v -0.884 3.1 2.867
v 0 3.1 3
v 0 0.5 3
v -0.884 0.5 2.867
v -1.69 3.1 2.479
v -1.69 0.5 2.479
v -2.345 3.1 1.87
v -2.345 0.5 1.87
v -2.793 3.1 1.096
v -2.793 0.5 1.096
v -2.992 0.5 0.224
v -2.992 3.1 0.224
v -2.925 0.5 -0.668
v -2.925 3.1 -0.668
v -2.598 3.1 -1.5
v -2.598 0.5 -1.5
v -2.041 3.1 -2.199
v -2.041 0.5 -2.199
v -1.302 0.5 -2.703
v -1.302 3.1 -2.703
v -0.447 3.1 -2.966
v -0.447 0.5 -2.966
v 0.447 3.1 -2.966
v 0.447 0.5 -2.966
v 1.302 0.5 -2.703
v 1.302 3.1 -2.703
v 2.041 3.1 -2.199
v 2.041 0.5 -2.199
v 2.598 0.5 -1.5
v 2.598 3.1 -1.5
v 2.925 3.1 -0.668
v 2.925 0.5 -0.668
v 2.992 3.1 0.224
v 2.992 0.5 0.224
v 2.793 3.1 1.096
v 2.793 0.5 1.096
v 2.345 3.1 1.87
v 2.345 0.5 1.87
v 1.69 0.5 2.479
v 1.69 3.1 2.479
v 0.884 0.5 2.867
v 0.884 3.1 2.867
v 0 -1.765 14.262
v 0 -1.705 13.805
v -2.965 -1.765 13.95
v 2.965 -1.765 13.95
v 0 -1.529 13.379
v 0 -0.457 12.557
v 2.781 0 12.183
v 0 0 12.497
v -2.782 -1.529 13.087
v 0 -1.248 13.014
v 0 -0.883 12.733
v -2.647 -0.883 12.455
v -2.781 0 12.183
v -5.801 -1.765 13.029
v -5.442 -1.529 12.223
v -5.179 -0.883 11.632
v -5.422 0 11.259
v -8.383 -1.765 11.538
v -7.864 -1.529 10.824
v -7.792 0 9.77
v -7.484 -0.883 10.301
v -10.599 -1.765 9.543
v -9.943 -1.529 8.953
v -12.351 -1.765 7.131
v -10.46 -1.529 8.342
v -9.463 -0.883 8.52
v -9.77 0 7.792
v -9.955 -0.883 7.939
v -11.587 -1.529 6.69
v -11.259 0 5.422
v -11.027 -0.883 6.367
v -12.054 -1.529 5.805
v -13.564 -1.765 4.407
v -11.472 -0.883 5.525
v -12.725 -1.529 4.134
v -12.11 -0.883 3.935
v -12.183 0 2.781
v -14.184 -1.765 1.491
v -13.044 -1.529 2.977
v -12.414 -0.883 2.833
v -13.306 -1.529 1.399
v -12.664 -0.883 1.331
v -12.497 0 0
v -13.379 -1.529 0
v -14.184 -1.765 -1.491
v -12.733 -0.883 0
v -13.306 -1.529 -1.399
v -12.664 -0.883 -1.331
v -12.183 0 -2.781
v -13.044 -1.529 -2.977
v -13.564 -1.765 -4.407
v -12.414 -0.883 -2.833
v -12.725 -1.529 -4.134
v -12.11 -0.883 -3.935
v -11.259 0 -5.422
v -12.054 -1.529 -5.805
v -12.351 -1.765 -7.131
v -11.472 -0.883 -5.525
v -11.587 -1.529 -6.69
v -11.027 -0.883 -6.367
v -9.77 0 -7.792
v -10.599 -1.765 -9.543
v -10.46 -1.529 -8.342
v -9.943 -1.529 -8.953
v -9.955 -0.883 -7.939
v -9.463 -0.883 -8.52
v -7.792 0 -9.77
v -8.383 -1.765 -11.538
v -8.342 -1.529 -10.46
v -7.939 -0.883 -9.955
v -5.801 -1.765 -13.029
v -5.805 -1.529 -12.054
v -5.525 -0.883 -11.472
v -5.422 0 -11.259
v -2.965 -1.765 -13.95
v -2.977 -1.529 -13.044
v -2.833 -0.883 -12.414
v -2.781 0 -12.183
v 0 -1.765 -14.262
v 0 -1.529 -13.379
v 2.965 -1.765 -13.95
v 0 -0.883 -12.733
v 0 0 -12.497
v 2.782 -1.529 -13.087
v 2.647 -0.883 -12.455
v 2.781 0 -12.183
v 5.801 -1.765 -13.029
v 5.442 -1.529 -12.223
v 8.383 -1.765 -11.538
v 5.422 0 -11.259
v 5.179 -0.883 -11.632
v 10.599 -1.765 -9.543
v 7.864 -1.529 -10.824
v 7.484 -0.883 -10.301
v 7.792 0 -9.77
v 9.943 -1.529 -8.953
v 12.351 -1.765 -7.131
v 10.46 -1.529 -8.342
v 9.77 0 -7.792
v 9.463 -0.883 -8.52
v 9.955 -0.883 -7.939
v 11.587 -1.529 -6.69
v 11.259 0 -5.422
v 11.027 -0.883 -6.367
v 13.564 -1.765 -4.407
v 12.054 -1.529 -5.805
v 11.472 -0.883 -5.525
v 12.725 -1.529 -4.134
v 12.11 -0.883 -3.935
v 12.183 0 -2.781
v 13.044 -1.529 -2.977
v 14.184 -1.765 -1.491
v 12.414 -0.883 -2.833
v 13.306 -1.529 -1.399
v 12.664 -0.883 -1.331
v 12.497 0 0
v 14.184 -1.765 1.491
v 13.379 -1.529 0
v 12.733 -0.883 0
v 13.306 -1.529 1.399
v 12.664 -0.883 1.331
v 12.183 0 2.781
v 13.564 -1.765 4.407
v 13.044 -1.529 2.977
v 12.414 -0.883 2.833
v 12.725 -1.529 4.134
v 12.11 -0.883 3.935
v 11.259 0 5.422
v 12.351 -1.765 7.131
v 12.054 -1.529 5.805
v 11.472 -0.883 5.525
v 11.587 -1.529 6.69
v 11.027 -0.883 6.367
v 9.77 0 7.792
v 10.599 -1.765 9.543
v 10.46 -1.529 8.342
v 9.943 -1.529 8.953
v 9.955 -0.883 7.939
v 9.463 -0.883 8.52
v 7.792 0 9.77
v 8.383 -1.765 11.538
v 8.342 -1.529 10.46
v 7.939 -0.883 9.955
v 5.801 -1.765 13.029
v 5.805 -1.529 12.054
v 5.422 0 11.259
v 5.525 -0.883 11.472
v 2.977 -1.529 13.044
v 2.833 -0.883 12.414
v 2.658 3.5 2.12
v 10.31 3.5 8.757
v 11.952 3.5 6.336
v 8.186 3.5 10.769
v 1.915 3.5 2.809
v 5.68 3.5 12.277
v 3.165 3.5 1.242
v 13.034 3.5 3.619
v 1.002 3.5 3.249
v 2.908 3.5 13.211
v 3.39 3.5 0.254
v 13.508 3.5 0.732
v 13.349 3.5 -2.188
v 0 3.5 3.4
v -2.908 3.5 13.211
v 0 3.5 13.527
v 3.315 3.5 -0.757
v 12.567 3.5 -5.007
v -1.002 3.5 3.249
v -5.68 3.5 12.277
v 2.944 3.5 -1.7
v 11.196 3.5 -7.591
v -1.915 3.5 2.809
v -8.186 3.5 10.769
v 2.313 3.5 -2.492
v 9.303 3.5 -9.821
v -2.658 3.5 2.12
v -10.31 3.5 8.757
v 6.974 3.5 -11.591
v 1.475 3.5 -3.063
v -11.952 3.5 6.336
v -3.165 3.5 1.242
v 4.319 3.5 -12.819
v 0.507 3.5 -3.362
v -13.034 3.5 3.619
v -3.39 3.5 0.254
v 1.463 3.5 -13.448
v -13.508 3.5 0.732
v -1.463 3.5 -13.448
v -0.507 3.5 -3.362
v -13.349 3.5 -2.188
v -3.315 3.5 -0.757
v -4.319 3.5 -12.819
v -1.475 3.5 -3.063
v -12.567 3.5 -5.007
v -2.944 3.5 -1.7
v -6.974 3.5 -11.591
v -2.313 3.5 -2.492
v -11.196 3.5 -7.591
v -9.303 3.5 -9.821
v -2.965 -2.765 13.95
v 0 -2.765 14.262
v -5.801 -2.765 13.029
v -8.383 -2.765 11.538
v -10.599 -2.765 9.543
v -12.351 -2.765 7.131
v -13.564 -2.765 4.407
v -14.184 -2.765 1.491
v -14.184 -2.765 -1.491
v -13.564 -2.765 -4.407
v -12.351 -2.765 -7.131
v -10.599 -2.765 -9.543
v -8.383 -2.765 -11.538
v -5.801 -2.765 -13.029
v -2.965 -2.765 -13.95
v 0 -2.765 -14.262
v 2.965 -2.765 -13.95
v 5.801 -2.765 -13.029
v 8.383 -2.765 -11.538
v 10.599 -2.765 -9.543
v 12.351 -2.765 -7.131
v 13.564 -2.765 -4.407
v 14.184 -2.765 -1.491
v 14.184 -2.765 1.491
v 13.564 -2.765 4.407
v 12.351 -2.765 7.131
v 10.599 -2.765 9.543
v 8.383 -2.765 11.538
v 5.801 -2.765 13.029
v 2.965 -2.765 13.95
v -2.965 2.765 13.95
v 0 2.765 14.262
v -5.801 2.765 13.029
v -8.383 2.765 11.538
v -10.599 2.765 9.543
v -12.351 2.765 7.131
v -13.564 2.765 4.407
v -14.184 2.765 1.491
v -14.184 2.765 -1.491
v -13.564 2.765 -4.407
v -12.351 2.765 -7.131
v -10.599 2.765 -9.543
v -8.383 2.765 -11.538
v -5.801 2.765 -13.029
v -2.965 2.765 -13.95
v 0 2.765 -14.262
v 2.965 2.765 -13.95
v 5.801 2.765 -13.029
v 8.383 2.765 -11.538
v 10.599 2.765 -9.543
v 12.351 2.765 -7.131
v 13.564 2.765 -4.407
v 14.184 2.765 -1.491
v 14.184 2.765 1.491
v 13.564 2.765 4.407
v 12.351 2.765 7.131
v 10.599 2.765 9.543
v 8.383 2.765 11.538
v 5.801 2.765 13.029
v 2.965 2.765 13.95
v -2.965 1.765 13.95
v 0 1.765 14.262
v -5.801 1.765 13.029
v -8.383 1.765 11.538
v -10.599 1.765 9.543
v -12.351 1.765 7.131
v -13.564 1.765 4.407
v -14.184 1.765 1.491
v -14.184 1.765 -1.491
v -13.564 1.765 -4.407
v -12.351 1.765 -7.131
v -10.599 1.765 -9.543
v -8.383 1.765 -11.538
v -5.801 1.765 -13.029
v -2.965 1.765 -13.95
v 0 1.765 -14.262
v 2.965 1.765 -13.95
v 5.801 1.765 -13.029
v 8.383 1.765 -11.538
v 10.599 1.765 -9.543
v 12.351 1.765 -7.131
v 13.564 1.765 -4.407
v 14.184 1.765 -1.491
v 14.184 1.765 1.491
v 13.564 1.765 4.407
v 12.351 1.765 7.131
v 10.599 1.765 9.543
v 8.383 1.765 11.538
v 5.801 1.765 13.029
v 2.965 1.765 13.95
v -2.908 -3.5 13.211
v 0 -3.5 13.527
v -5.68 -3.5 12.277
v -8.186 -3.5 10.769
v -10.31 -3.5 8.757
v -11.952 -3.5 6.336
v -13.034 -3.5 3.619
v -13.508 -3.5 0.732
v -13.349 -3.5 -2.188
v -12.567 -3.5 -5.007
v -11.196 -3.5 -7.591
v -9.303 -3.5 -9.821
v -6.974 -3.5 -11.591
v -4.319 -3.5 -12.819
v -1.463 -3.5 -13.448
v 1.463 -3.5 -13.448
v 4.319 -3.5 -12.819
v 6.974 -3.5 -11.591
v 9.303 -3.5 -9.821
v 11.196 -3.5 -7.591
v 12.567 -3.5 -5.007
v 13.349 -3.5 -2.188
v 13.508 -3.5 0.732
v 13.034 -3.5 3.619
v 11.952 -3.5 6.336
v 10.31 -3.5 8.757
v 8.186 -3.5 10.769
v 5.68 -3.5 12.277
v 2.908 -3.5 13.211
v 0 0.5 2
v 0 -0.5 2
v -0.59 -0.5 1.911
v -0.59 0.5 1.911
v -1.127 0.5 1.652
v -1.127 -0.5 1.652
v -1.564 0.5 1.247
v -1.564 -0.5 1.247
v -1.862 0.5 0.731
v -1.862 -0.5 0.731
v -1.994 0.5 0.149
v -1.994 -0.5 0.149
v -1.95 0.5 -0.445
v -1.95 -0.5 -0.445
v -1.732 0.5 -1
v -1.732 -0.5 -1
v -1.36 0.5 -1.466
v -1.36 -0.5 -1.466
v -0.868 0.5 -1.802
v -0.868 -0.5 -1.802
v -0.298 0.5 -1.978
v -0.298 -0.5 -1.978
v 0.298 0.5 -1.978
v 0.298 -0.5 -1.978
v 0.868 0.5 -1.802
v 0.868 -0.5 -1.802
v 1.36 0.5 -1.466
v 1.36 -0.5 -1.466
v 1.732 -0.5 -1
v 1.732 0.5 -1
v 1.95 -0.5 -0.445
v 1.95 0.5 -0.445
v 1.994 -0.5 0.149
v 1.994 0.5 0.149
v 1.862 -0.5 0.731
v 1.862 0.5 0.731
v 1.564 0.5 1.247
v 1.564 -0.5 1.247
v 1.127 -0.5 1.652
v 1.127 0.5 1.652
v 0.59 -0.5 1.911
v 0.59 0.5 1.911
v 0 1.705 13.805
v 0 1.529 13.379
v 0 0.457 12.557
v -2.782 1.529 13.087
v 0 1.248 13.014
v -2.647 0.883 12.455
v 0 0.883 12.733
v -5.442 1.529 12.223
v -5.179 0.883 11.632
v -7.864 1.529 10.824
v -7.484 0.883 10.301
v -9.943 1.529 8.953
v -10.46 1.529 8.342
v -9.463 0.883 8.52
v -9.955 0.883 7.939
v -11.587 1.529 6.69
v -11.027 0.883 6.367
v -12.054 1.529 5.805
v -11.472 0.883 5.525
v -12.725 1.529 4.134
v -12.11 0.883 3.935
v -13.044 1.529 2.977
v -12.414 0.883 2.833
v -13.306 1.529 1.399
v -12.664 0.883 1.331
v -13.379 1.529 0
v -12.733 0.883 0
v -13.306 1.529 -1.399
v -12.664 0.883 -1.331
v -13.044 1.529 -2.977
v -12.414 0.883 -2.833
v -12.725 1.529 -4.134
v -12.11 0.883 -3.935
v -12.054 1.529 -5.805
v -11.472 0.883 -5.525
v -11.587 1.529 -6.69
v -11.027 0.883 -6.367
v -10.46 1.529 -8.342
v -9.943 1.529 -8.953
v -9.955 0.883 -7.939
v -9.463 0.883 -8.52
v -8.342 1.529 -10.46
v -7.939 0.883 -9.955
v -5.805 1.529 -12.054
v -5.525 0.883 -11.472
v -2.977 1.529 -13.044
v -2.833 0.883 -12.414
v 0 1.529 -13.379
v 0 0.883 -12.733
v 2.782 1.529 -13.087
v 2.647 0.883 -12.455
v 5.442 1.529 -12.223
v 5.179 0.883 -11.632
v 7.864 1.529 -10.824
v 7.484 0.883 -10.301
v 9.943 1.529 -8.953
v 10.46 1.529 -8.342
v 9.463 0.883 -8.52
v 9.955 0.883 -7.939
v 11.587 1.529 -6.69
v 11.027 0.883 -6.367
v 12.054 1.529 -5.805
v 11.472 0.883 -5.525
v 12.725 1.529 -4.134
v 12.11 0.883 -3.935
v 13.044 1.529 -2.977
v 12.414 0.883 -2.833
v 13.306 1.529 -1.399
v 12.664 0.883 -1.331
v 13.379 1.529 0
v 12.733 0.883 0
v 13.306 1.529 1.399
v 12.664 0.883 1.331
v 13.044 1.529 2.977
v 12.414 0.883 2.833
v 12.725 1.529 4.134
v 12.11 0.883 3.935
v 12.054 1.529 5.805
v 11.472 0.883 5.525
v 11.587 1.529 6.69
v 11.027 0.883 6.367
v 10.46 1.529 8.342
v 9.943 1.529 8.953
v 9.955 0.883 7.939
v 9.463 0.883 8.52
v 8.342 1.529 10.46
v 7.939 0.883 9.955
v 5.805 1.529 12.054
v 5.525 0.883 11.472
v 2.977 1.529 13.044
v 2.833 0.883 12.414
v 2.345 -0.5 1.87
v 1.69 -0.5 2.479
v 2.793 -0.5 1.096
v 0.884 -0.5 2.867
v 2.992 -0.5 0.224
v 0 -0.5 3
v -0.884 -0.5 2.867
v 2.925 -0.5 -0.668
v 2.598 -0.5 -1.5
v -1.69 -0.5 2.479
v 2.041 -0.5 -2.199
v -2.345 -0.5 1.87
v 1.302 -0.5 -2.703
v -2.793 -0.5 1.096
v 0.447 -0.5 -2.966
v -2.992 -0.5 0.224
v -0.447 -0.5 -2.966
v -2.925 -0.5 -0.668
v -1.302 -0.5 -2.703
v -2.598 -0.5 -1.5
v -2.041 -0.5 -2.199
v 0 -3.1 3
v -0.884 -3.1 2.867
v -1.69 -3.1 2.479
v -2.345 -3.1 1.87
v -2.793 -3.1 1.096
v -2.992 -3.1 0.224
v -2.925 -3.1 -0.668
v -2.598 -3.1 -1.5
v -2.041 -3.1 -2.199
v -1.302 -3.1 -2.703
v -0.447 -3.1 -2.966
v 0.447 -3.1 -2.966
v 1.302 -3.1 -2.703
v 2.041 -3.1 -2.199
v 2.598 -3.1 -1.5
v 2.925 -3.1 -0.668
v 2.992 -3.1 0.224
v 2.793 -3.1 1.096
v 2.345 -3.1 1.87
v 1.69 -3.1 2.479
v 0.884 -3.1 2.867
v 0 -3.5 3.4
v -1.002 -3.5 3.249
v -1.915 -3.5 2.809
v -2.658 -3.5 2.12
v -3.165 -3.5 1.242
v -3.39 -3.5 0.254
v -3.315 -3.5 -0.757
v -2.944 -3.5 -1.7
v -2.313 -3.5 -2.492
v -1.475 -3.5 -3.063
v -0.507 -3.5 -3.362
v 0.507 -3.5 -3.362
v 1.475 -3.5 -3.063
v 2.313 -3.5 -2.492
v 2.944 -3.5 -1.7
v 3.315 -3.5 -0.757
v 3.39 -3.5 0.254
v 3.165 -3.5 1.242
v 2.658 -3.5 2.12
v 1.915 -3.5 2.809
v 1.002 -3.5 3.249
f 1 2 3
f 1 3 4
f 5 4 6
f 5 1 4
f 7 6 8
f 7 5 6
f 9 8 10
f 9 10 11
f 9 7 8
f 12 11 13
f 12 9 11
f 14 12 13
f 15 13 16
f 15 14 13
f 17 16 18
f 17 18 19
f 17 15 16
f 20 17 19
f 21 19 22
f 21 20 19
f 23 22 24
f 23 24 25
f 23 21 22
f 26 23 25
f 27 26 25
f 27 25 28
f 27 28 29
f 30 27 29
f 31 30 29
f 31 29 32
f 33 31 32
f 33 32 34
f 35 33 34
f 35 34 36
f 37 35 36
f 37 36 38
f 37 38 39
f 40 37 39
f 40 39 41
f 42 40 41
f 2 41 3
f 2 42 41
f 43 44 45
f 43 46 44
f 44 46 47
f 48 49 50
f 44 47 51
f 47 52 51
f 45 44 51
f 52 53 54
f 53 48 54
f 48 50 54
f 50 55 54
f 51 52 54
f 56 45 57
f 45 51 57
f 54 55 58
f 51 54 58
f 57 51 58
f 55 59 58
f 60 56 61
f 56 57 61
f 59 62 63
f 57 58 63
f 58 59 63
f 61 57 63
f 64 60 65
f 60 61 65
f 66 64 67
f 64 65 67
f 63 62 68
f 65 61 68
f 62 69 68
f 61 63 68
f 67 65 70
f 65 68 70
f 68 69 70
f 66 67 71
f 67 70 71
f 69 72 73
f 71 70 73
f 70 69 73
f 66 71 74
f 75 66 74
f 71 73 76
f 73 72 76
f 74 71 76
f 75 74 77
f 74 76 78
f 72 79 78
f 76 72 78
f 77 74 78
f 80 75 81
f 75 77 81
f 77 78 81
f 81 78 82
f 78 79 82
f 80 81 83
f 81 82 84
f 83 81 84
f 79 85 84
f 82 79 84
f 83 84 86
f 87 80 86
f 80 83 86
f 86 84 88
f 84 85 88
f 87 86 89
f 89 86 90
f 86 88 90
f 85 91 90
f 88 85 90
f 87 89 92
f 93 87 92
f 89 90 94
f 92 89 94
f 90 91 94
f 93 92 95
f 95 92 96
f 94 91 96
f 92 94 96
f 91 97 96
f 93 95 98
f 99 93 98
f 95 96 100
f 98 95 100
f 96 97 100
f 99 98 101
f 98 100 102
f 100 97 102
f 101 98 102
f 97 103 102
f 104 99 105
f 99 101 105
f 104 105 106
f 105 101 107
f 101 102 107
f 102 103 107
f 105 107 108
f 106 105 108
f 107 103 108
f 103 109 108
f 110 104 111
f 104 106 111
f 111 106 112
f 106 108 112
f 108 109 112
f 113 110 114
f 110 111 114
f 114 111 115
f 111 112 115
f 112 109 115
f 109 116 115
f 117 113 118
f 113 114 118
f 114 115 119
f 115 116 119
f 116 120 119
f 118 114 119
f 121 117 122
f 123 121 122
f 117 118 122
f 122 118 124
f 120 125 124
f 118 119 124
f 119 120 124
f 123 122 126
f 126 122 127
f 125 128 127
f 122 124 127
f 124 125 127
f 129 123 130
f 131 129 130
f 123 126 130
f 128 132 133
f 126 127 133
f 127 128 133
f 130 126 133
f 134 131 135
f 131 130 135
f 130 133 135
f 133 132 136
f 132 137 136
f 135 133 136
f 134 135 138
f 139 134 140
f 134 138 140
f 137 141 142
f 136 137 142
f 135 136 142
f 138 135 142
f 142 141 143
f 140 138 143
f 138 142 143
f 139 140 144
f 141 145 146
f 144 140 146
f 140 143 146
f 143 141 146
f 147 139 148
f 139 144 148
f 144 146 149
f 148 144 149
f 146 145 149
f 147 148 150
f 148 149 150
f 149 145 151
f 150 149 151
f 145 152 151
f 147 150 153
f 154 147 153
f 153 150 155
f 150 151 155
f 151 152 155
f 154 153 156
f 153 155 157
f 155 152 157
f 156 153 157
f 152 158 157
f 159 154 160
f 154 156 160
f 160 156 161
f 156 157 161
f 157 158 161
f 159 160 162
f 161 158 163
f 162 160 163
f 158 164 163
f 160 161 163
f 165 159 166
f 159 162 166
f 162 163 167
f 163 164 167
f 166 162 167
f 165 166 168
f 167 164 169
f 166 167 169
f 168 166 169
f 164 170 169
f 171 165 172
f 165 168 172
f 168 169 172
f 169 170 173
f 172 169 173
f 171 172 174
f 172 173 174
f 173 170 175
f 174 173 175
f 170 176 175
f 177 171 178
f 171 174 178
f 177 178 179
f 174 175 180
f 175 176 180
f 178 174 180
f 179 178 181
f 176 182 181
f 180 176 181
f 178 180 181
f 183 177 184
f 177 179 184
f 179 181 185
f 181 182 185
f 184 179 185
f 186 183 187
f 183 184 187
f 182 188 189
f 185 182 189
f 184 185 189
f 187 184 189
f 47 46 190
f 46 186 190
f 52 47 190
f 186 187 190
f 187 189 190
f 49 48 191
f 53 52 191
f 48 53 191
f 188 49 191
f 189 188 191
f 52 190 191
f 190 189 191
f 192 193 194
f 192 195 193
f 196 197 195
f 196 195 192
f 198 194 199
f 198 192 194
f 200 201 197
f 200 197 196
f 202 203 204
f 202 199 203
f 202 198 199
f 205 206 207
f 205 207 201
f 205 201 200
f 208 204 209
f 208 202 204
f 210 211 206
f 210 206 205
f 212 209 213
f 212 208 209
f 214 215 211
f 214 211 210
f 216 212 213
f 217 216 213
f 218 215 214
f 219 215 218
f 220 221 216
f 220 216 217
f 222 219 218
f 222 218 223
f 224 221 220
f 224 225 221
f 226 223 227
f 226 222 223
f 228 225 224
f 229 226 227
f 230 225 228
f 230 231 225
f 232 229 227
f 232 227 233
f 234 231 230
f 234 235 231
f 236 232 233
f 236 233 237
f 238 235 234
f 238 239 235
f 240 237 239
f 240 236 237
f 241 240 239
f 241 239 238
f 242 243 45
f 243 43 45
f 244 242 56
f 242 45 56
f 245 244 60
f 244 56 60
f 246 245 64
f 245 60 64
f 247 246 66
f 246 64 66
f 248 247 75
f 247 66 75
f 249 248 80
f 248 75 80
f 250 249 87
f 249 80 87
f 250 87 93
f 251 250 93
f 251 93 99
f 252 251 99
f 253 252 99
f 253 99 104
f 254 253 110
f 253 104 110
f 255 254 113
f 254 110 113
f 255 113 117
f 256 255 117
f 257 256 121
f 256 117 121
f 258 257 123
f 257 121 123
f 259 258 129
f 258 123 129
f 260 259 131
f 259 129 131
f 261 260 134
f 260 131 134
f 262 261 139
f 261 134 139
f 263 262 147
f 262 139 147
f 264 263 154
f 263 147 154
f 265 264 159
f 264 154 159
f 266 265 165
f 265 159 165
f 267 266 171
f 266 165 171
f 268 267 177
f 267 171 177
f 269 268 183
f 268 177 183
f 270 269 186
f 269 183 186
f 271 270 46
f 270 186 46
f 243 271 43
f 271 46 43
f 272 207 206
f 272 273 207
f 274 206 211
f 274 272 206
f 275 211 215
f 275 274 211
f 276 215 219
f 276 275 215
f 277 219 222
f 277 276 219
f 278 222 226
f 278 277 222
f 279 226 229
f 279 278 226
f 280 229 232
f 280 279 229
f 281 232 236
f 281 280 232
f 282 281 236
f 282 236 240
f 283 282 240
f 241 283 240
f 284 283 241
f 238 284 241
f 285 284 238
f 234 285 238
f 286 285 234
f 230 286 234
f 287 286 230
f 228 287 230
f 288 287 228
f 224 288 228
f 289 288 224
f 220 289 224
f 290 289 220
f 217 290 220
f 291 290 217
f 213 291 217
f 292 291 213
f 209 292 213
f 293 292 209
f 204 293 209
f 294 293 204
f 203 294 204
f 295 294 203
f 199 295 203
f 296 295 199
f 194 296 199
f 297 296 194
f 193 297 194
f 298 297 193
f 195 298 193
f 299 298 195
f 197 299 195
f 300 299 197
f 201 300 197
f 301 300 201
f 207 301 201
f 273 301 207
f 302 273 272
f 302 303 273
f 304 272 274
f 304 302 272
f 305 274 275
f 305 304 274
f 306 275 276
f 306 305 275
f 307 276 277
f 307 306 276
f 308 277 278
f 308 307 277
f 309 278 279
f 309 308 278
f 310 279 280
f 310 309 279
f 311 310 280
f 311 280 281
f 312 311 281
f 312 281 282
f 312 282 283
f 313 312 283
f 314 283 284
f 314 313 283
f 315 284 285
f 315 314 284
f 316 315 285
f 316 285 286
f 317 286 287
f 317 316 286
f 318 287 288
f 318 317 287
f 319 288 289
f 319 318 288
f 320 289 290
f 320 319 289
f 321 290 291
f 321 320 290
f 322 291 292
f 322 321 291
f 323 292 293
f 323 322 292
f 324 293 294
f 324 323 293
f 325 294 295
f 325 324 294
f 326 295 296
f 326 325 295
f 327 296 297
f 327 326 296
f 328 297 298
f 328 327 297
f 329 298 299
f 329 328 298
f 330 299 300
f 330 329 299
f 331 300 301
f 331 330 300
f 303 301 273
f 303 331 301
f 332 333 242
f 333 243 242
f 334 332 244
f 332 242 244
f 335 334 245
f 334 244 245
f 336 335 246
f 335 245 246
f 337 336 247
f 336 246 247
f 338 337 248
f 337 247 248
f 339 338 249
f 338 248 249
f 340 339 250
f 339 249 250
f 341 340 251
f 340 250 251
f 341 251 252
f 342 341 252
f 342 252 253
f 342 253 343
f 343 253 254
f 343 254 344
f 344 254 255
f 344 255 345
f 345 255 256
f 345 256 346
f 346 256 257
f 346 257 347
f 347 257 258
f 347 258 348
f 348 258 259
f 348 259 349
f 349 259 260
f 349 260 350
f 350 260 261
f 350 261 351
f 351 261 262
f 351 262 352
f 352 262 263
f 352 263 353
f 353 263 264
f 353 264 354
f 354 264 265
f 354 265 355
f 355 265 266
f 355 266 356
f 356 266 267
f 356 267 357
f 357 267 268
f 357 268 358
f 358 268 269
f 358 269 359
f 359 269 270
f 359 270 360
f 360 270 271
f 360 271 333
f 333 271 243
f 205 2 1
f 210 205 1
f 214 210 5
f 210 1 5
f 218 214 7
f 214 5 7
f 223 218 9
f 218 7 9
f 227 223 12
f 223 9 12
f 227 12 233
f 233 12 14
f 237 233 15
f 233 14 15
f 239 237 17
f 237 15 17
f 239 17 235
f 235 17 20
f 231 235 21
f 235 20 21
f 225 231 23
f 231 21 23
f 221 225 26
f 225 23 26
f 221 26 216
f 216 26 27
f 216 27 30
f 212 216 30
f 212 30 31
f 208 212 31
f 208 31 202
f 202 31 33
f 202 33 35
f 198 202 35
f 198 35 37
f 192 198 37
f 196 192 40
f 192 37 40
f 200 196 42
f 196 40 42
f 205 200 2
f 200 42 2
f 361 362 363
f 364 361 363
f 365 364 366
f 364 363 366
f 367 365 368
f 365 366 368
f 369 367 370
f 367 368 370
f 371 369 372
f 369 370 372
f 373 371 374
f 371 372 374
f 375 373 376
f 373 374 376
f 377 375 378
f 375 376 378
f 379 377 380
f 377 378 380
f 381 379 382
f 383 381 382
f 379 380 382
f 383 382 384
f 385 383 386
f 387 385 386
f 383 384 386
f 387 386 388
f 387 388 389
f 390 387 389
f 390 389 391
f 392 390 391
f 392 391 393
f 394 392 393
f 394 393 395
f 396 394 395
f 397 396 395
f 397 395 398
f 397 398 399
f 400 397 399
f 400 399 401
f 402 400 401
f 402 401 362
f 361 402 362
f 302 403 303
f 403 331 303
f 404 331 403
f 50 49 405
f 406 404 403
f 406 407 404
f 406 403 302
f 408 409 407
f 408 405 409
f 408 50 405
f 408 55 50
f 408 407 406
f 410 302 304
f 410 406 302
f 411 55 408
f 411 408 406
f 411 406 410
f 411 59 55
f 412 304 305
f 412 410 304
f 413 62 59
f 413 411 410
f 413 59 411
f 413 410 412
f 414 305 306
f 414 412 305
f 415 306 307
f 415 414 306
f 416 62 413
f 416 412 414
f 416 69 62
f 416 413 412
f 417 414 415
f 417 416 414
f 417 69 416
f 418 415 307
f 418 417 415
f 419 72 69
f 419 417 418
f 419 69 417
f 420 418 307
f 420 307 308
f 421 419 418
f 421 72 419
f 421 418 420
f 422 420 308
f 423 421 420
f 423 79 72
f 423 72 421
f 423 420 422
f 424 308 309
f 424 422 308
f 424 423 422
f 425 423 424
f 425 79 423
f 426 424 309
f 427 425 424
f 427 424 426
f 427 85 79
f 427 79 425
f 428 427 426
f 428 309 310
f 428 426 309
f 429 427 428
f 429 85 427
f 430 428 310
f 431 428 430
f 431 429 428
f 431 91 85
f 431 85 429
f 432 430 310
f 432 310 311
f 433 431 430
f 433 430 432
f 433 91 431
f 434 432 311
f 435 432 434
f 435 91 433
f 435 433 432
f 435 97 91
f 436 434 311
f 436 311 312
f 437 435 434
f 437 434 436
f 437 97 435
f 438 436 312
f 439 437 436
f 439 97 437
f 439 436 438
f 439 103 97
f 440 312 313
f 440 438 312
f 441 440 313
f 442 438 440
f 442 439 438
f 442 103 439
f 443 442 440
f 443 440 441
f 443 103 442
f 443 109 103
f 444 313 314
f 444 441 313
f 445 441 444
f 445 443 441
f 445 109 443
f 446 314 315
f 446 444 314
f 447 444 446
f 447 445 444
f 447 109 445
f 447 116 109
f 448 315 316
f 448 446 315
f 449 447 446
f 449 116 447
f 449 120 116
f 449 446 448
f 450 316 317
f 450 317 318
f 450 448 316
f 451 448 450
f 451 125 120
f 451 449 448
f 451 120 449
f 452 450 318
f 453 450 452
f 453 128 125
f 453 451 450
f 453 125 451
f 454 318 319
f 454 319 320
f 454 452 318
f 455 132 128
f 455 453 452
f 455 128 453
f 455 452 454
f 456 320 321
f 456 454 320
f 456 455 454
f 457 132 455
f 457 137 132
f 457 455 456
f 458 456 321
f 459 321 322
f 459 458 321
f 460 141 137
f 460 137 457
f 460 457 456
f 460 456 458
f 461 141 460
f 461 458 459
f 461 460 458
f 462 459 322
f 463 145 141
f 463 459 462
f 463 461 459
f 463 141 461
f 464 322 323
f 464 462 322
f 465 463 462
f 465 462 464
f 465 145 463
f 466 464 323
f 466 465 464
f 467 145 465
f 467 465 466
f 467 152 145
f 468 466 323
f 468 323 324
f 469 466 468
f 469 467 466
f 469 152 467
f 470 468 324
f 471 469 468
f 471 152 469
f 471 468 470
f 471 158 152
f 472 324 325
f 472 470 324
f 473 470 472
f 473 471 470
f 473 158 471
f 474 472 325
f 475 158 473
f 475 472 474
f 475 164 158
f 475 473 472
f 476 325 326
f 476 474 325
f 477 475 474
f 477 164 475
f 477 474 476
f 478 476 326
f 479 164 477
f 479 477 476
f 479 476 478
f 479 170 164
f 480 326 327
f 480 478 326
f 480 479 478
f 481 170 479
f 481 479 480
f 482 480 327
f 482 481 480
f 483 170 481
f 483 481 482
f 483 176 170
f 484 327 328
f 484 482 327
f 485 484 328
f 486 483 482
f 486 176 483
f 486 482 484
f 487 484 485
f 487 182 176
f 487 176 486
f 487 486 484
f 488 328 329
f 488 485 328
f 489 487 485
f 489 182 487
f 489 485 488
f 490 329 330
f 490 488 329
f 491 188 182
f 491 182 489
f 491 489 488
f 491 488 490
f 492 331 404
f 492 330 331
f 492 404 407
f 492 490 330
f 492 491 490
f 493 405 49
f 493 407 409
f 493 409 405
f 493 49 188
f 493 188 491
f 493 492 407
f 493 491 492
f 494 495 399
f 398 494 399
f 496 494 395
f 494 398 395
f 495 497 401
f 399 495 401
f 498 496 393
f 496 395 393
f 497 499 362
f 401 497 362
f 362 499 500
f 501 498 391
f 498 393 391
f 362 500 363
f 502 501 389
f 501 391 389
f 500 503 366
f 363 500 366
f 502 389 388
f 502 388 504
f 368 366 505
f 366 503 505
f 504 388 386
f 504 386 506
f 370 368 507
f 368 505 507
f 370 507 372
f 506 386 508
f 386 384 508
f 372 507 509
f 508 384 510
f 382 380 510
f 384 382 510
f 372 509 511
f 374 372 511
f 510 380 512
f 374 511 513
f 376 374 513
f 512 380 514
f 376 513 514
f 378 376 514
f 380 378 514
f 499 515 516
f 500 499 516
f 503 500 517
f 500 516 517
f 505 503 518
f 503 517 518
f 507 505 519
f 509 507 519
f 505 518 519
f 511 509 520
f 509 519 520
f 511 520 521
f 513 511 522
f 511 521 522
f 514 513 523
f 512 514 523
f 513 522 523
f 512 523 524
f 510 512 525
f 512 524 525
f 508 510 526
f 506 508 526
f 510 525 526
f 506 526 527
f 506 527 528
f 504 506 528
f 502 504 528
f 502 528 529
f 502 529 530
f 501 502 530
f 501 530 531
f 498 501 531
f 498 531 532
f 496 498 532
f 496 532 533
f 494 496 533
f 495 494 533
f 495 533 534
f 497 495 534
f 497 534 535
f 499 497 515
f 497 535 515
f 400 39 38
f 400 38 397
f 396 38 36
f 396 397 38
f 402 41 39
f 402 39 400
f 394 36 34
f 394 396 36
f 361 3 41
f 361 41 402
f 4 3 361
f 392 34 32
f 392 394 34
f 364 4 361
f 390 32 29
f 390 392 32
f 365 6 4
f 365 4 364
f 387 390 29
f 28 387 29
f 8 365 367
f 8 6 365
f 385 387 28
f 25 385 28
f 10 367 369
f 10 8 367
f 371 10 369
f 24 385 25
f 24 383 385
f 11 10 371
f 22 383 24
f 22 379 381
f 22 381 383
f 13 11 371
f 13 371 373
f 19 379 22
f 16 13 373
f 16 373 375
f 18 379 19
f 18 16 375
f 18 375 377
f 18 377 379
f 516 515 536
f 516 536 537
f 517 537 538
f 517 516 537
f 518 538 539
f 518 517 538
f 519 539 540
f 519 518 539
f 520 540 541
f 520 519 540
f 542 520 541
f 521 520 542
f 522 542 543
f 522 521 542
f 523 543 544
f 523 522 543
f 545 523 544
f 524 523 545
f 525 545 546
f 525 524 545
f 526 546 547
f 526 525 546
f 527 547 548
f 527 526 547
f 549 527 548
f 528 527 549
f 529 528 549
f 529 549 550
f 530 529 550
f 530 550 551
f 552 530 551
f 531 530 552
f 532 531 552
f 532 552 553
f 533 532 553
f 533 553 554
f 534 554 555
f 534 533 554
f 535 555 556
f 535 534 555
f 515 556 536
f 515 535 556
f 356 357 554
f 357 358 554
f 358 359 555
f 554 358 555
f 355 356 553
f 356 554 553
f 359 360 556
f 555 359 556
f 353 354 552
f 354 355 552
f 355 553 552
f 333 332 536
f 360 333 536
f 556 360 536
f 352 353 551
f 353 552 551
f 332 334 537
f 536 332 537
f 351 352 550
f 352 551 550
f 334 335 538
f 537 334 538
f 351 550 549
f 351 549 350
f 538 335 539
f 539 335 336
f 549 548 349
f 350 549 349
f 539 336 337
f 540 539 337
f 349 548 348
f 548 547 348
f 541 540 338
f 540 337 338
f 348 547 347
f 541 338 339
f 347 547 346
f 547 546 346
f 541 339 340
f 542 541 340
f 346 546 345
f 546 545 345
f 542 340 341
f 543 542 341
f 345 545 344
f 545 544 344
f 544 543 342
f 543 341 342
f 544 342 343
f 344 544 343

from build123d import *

# Parameters (mm, degrees)
CHAMFER1_SIZE = 0.4


with BuildPart() as part:
    # Sketch1 → Revolve1 (revolve)
    with BuildSketch(Plane(origin=(0, 0, 0), x_dir=(0, 0, -1), z_dir=(1, 0, 0))):
        with BuildLine():
            Line((-3, 3.5), (-13.5274, 3.5))
            Line((-13.5274, 3.5), (-14.2621, 2.7653))
            Line((-14.2621, 2.7653), (-14.2621, 1.7653))
            ThreePointArc((-14.2621, 1.7653), (-13.013844399, 1.248255601), (-12.4968, 0))
            Line((-12.4968, 0), (-2, 0))
            Line((-2, 0), (-2, 0.5))
            Line((-2, 0.5), (-3, 0.5))
            Line((-3, 0.5), (-3, 3.5))
        make_face()
    revolve1 = revolve(axis=Axis((0, 19.017402143, 0), (0, -1, 0)))

    # Mirror1: Revolve1 across plane
    add(revolve1.mirror(Plane.ZX))

    # Chamfer1
    chamfer1_edges = [part.edges().sort_by_distance(p)[0] for p in [
        (0, 3.5, -3),
        (0, -3.5, -3),
    ]]
    chamfer(chamfer1_edges, length=CHAMFER1_SIZE)


solid = part.part
